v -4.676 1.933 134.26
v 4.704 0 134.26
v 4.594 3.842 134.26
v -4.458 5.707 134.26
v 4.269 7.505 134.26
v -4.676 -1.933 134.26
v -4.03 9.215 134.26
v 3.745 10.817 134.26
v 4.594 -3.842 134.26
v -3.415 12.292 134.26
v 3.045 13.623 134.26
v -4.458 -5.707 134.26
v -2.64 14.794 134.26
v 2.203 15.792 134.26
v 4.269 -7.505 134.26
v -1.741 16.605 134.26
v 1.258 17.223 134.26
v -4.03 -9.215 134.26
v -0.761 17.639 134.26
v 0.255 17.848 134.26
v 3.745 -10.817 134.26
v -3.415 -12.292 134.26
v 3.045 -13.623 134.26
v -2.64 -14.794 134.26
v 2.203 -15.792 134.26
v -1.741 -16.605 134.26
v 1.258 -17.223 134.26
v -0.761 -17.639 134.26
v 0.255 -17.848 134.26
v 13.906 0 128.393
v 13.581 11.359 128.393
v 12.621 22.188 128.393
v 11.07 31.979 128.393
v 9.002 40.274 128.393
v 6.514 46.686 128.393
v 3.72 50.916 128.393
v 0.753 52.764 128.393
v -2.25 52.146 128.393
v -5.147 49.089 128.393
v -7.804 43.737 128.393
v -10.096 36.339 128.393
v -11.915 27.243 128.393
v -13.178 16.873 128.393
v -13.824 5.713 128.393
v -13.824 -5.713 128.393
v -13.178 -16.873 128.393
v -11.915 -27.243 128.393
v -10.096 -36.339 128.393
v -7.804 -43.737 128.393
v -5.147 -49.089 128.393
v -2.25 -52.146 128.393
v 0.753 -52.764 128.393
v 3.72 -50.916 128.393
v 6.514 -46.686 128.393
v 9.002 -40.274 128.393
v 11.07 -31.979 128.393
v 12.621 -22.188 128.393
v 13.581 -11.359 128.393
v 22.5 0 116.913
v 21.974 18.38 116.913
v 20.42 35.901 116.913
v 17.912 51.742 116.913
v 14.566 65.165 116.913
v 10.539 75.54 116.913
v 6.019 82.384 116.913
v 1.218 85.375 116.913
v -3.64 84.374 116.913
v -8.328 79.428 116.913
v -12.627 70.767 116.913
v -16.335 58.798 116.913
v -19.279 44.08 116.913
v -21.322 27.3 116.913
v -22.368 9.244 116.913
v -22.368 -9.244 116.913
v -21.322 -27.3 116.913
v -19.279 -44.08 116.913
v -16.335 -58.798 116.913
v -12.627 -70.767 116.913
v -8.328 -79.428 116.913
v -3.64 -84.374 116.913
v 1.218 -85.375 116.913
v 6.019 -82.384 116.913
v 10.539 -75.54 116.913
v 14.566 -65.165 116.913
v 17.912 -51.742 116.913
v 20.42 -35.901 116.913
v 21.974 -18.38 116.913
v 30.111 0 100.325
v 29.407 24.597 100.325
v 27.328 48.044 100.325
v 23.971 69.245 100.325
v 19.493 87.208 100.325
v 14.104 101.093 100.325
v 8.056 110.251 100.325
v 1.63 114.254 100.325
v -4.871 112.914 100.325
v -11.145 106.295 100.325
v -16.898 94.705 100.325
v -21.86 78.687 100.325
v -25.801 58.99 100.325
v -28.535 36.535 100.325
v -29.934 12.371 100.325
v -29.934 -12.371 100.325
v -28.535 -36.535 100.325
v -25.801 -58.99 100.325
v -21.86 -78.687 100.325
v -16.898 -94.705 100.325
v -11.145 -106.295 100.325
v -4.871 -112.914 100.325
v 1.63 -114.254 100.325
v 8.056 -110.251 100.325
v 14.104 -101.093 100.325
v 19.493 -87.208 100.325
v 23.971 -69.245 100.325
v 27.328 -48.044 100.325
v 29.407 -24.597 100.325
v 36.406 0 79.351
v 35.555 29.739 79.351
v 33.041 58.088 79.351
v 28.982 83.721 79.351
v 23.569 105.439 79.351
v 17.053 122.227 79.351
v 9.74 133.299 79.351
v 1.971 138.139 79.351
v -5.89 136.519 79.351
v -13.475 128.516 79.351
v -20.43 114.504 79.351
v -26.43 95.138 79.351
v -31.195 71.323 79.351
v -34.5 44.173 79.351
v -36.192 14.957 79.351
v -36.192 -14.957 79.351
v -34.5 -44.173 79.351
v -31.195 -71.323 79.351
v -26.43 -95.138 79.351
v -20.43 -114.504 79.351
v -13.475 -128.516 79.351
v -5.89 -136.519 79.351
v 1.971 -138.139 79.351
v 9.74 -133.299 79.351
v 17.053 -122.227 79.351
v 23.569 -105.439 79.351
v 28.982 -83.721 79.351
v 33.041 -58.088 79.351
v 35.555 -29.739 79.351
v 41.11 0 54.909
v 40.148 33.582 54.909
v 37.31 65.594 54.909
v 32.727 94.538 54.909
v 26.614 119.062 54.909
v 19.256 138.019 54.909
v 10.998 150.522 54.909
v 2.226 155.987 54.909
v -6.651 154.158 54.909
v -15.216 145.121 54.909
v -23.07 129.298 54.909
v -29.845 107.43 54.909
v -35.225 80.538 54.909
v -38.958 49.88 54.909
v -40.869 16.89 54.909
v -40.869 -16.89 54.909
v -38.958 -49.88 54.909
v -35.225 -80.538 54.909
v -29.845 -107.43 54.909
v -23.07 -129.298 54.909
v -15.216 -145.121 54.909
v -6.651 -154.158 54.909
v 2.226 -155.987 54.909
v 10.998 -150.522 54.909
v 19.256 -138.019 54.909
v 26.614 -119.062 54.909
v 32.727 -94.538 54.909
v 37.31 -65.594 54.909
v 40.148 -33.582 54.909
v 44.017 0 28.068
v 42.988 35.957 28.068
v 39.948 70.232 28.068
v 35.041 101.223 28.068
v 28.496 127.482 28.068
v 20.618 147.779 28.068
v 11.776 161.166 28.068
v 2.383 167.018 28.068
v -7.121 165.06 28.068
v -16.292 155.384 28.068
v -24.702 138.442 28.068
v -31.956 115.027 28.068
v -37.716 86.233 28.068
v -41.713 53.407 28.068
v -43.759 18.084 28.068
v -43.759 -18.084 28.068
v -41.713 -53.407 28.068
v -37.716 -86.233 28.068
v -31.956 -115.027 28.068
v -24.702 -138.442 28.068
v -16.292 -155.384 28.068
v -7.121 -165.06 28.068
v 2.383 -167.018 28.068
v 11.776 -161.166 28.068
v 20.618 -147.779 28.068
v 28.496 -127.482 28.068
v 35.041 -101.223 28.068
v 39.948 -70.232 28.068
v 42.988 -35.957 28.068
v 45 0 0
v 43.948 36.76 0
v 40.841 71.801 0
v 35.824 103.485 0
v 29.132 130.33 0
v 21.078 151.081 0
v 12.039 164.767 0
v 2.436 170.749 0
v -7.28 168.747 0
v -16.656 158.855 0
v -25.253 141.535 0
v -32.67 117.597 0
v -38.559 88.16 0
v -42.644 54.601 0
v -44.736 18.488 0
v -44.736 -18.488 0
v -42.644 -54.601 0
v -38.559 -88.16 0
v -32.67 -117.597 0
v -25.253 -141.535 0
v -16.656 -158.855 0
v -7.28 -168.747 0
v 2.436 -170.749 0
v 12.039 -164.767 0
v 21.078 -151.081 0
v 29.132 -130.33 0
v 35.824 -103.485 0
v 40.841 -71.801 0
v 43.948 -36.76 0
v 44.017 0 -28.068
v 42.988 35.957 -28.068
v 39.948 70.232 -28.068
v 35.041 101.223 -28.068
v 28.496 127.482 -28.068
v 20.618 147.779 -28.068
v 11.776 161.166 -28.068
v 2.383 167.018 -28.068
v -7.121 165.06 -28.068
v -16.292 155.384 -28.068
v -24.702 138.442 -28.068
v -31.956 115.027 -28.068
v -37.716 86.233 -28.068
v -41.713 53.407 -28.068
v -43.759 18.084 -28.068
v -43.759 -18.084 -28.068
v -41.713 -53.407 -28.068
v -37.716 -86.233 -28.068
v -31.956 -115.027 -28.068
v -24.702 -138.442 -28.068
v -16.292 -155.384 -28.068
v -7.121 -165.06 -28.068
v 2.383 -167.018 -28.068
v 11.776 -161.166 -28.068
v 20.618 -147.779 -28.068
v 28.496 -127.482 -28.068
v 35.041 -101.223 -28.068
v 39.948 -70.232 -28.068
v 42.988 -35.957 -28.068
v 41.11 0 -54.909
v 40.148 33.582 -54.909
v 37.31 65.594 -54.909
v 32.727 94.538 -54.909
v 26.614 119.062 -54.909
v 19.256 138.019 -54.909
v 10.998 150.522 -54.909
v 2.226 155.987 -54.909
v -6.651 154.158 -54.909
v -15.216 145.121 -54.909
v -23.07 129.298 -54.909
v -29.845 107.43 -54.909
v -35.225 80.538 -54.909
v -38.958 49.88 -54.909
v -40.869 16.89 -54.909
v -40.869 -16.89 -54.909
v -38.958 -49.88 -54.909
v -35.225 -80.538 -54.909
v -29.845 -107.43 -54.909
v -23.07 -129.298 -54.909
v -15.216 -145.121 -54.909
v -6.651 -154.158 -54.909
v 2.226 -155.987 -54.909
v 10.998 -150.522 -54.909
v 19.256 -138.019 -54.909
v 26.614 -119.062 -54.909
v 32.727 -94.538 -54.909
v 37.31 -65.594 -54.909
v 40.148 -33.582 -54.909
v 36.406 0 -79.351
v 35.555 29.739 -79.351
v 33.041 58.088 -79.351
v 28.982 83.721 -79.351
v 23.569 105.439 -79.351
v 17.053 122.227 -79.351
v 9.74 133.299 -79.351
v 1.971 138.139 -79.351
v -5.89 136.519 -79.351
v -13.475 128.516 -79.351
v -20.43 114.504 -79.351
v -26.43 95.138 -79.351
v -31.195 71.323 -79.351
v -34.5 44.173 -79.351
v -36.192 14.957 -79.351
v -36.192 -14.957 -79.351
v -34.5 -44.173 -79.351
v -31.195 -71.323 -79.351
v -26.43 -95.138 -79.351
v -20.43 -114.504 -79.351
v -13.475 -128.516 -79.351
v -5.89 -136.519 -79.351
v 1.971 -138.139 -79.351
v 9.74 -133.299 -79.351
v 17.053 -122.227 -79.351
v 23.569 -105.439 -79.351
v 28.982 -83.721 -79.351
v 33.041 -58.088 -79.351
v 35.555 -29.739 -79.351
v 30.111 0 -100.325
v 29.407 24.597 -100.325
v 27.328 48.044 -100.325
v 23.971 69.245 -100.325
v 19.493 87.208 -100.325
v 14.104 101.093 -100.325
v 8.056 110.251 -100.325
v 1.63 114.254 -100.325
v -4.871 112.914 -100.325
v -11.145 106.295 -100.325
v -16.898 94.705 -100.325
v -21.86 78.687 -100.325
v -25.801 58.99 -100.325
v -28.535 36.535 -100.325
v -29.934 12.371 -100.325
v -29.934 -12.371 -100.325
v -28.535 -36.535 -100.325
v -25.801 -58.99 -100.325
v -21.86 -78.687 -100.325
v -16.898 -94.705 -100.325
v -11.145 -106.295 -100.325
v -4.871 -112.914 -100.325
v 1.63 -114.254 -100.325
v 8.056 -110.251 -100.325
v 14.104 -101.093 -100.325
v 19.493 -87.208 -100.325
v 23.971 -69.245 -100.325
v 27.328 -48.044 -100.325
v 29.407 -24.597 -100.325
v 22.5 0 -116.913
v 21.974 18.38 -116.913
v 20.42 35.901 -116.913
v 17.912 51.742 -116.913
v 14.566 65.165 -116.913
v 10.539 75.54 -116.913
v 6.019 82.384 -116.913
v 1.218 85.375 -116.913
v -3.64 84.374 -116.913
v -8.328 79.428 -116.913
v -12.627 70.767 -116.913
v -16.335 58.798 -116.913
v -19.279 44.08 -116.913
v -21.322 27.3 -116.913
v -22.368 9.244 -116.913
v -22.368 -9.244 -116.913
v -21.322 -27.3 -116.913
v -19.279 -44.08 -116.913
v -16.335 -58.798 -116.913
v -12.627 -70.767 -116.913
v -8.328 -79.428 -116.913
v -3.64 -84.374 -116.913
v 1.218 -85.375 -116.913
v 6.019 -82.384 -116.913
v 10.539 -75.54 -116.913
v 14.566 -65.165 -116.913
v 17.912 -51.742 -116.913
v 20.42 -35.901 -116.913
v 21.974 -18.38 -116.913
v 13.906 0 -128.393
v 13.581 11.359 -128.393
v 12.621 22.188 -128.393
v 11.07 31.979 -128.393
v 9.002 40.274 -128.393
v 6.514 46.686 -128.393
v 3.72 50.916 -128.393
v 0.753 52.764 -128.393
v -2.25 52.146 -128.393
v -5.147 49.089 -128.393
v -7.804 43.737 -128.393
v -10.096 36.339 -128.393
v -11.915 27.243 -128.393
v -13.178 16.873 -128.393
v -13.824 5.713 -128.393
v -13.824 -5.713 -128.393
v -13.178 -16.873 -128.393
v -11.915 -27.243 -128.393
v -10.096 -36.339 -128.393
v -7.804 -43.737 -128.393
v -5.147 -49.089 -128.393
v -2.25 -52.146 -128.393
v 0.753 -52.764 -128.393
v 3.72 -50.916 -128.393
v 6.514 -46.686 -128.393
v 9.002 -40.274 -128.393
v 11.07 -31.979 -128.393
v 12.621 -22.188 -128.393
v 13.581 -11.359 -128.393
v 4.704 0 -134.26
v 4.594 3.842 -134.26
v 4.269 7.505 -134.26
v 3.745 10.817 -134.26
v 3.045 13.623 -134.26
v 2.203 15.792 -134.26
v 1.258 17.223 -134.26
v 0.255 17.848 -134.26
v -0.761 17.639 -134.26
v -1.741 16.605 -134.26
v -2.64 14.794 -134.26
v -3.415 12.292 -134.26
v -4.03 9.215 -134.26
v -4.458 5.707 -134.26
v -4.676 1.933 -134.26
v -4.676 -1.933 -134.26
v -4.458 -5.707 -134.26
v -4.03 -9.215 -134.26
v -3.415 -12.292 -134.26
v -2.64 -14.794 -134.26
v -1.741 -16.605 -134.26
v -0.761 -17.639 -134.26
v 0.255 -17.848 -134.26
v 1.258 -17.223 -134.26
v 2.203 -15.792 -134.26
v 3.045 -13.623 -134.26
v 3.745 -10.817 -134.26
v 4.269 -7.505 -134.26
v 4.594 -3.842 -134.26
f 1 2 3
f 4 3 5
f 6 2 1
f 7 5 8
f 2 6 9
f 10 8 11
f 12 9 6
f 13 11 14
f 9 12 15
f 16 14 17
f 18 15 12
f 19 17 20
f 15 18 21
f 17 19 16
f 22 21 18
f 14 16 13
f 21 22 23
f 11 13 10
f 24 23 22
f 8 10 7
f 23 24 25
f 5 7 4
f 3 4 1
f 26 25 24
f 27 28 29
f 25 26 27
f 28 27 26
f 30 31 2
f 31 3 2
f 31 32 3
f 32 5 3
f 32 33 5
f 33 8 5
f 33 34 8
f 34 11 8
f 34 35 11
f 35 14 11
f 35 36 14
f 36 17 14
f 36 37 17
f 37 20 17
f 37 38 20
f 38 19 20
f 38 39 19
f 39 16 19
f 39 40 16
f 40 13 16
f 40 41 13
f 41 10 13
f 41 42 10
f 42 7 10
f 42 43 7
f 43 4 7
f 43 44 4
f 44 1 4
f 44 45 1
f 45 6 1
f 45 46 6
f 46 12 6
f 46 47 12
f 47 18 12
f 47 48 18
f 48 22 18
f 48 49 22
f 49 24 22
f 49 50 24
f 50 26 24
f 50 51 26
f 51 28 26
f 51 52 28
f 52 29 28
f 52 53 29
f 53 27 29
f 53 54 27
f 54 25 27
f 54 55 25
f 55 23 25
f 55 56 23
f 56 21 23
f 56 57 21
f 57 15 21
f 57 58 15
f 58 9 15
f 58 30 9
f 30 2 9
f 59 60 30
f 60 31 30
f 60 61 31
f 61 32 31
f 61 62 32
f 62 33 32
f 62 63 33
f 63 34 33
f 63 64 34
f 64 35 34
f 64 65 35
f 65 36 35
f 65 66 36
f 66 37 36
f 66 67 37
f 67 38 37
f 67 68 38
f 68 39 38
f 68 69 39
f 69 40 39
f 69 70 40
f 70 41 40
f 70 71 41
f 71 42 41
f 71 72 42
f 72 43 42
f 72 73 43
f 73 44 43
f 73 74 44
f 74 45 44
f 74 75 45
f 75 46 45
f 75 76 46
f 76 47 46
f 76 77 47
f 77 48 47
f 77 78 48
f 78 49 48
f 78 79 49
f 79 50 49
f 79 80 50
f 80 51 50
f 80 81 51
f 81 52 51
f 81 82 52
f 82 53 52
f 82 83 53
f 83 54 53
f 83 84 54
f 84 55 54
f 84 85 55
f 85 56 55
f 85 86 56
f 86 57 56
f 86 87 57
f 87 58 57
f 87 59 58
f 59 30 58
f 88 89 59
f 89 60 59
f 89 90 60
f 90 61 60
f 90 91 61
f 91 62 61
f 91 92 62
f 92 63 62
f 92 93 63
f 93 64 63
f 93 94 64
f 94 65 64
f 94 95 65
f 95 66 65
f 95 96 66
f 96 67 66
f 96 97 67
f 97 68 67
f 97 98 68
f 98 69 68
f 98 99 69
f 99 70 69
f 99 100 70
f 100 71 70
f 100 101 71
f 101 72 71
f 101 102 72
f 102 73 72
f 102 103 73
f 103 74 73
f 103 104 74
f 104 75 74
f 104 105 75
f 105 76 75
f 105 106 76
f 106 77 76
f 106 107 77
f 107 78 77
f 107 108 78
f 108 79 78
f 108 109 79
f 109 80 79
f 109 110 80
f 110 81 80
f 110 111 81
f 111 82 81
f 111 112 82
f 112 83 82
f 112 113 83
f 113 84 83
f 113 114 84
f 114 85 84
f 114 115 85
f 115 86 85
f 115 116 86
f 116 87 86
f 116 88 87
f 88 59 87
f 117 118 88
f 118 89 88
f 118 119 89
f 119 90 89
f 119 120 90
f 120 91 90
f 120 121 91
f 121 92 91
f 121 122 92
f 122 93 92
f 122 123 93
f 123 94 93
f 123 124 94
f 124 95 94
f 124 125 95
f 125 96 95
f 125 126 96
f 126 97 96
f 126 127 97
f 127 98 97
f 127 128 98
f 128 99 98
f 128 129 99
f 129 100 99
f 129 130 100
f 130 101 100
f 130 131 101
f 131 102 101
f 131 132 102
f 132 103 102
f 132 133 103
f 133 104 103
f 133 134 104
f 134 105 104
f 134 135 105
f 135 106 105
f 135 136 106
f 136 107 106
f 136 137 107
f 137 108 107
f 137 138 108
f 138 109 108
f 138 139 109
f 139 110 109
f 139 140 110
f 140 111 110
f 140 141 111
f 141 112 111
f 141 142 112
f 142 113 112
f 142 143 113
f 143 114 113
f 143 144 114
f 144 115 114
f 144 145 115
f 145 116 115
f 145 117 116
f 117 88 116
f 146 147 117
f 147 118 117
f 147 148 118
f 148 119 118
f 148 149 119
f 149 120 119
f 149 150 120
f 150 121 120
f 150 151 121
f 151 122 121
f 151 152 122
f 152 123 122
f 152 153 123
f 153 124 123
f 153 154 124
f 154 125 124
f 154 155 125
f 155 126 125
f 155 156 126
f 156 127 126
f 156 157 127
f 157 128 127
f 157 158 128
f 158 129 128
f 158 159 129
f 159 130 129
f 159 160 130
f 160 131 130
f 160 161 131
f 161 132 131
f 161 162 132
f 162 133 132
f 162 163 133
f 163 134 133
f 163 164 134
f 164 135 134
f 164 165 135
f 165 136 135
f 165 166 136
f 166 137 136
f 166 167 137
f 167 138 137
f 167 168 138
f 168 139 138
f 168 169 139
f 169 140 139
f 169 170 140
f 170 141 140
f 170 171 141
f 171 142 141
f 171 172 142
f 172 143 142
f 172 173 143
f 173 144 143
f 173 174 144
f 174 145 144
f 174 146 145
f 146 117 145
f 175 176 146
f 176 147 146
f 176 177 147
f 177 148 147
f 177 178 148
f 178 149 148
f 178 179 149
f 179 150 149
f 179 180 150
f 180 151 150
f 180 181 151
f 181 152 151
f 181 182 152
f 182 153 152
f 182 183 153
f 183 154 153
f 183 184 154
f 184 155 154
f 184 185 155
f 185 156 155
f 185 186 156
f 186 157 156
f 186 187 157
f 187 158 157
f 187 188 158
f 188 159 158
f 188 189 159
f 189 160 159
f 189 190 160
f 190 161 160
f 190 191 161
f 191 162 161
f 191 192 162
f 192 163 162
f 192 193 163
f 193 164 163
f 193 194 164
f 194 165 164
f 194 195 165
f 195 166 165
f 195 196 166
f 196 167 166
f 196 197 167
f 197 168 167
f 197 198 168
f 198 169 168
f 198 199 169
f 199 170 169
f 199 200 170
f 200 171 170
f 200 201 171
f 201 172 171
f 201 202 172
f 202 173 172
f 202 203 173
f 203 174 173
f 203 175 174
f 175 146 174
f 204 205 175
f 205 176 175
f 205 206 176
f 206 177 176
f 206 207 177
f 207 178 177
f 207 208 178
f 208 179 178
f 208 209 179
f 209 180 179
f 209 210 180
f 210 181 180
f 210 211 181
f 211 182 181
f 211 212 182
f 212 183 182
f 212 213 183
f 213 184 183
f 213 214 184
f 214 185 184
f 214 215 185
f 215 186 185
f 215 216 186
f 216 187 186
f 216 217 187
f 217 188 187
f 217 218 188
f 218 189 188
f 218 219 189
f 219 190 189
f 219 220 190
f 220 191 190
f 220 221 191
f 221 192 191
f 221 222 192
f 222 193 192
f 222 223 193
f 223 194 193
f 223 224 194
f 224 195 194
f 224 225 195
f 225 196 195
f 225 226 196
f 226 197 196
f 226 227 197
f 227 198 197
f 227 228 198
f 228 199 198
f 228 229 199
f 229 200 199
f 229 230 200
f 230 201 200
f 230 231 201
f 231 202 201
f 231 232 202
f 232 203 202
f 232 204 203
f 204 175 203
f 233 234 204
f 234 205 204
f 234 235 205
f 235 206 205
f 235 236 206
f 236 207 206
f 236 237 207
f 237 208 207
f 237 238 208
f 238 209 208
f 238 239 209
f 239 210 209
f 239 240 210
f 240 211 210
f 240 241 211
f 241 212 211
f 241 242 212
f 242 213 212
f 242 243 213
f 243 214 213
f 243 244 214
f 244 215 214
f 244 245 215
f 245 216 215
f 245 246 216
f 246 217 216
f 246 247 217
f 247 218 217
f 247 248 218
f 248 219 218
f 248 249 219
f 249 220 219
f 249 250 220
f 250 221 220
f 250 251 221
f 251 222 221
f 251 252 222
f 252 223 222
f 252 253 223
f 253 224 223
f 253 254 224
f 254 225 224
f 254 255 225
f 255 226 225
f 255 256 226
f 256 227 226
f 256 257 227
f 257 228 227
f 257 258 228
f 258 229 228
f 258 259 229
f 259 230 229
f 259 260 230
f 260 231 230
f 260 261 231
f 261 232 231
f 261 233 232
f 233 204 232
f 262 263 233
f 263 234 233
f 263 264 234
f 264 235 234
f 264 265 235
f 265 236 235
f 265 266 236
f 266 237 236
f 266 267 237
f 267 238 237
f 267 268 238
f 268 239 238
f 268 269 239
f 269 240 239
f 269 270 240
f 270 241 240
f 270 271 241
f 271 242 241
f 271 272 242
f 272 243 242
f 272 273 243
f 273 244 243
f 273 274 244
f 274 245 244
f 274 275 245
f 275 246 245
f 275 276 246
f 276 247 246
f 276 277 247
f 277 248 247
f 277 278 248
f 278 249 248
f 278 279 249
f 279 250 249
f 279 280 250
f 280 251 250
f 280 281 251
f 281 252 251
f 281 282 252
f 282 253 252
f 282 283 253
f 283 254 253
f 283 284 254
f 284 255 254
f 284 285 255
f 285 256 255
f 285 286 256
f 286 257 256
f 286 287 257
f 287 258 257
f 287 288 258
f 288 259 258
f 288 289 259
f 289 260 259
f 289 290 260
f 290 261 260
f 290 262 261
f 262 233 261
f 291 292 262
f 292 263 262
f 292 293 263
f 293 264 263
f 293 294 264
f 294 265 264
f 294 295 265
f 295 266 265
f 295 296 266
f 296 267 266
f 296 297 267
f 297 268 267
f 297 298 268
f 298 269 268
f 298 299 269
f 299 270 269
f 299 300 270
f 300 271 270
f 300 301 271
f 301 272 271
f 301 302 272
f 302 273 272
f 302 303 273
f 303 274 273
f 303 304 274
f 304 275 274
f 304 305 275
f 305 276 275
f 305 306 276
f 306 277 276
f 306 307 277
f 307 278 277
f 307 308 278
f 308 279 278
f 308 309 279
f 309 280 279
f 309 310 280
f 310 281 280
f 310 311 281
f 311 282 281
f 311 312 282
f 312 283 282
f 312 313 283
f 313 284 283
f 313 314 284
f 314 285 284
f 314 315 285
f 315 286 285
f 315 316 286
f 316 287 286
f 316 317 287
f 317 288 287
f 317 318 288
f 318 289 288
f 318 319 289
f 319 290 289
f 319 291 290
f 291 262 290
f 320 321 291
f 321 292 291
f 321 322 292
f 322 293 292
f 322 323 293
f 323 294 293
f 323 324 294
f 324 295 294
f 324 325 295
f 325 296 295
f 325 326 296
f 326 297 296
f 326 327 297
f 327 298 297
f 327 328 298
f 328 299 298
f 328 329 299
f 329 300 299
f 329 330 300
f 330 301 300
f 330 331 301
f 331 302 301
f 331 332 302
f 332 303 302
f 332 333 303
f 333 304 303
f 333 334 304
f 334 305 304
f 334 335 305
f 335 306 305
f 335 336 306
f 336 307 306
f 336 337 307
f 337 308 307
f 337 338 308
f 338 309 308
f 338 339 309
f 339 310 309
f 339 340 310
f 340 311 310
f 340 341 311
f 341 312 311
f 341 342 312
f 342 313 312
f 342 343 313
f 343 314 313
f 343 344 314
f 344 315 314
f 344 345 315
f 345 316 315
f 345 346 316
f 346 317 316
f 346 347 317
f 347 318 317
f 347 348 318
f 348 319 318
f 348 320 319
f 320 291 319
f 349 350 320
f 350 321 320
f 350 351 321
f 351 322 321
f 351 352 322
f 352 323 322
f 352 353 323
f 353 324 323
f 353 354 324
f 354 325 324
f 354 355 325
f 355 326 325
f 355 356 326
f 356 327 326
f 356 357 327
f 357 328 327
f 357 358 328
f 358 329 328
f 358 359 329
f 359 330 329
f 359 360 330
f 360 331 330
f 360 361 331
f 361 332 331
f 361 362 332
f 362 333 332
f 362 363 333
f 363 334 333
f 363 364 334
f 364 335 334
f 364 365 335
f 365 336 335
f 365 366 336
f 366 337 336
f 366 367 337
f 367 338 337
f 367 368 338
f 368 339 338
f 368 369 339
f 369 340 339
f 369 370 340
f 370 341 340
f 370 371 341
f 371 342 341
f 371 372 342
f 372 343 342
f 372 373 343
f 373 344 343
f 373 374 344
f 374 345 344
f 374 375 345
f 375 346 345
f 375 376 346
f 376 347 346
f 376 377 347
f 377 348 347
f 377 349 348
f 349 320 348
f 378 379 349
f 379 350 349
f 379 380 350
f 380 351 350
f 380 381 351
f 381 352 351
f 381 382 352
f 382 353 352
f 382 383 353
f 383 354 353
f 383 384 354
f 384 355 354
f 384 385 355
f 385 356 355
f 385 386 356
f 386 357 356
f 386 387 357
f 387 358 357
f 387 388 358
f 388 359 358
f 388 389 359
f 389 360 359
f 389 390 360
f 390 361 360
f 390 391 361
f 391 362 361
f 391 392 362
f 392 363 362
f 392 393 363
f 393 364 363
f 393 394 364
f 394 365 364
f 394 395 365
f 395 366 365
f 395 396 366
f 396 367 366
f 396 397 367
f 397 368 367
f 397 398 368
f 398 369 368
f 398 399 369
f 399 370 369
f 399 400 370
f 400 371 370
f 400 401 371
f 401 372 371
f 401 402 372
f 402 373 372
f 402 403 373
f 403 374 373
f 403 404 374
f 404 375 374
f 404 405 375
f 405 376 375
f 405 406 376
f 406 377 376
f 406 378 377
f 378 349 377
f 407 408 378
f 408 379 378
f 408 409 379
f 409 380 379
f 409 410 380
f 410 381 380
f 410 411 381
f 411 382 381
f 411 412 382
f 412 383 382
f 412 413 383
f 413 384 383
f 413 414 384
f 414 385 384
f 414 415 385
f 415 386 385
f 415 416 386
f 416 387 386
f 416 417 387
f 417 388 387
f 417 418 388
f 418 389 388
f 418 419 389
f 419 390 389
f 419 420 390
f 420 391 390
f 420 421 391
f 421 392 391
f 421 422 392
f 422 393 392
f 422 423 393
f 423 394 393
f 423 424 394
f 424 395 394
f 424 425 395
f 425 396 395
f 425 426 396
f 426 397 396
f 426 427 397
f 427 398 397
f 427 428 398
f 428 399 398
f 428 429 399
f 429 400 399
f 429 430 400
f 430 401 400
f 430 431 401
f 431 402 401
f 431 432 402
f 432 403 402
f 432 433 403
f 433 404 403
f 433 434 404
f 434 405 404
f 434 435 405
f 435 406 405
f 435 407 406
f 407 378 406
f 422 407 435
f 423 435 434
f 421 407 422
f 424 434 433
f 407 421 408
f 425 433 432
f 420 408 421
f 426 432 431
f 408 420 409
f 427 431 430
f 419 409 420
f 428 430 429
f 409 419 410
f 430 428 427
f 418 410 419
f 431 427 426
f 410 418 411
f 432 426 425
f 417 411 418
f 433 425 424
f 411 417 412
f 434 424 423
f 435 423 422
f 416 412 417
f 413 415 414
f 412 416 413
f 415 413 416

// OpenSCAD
// Generated by SolidPython 1.0.1 on 2020-07-29 00:46:47


scale(v = [5, 19, 15]) {
	sphere(r = 9);
}
/***********************************************
*********      SolidPython code:      **********
************************************************
 
# import packages: SolidPython
from solid import *
from solid.utils import *
from itertools import chain, combinations, permutations


class Resize:

    def __init__(self, scad_file):
        self.scad_file = scad_file
        #self.scad_file = import_scad(scad_file)
        # cone/cylinder param:
        self.r1 = 0
        self.r2 = 0
        self.h = 0
        # rectangular prism param:
        self.w = 0
        self.l = 0
        # ellipse param:
        self.r = 0

    # import OpenScad code (file name corresponds to shape)


    # classify shape + parameters
    def assign(self, param1, param2, param3):
        if self.scad_file == 'cone.scad':
            self.r1 = param1
            self.r2 = param2
            self.h = param3
        elif self.scad_file == 'cylinder.scad':
            self.r1 = param1
            self.r2 = param2
            self.h = param3
        elif self.scad_file == 'rectangularPrism.scad':
            self.h = param1
            self.l = param2
            self.w = param3
        else:
            self.r = param1
            self.h = param2

    # resize parameters
    def iterate(self):
        x = range(3, 20, 2)
        i = 1
        if self.scad_file == 'cone.scad':
            tempList = list(permutations(x, 2))
            for temp in tempList:
                param1 = temp[0]
                param2 = temp[1]
                filepath = 'produced_scad_files/' + 'cone' + str(param1) + '_' + str(param2) + '_' + '.scad'
                scad_render_to_file(cylinder(h=param1, r1=param2, r2=0), filepath)

        elif self.scad_file == 'cylinder.scad':
            tempList = list(permutations(x, 3))
            for temp in tempList:
                param1 = temp[0]
                param2 = temp[1]
                filepath = 'produced_scad_files/' + 'cylinder' + str(param1) + '_' + str(param2) + '_' + '.scad'
                scad_render_to_file(cylinder(h=param1, r1=param2, r2=param2), filepath)

        elif self.scad_file == 'rectangularPrism.scad':
            tempList = list(permutations(x, 3))
            for temp in tempList:
                param1 = temp[0]
                param2 = temp[1]
                param3 = temp[2]
                filepath = 'produced_scad_files/' + 'rectangularPrism' + str(param1) + '_' + str(param2) + '_' + str(
                    param3) + '.scad'
                scad_render_to_file(cube(size=(param1, param2, param3)), filepath)

        elif self.scad_file == 'ellipse.scad':
            tempList = list(permutations(x, 4))
            for temp in tempList:
                param1 = temp[0]
                param2 = temp[1]
                param3 = temp[2]
                param4 = temp[3]
                filepath = 'produced_scad_files/' + 'ellipse' + str(param1) + '_' + str(param2) + '_' + str(param3) + '_' + str(param4) + '.scad'
                scad_render_to_file(scale([param1, param2, param3])(sphere(r=param4)), filepath)

    def render_to_scadfile(self):
        scad_render_to_file(scad, 'example.scad') 
 
************************************************/
